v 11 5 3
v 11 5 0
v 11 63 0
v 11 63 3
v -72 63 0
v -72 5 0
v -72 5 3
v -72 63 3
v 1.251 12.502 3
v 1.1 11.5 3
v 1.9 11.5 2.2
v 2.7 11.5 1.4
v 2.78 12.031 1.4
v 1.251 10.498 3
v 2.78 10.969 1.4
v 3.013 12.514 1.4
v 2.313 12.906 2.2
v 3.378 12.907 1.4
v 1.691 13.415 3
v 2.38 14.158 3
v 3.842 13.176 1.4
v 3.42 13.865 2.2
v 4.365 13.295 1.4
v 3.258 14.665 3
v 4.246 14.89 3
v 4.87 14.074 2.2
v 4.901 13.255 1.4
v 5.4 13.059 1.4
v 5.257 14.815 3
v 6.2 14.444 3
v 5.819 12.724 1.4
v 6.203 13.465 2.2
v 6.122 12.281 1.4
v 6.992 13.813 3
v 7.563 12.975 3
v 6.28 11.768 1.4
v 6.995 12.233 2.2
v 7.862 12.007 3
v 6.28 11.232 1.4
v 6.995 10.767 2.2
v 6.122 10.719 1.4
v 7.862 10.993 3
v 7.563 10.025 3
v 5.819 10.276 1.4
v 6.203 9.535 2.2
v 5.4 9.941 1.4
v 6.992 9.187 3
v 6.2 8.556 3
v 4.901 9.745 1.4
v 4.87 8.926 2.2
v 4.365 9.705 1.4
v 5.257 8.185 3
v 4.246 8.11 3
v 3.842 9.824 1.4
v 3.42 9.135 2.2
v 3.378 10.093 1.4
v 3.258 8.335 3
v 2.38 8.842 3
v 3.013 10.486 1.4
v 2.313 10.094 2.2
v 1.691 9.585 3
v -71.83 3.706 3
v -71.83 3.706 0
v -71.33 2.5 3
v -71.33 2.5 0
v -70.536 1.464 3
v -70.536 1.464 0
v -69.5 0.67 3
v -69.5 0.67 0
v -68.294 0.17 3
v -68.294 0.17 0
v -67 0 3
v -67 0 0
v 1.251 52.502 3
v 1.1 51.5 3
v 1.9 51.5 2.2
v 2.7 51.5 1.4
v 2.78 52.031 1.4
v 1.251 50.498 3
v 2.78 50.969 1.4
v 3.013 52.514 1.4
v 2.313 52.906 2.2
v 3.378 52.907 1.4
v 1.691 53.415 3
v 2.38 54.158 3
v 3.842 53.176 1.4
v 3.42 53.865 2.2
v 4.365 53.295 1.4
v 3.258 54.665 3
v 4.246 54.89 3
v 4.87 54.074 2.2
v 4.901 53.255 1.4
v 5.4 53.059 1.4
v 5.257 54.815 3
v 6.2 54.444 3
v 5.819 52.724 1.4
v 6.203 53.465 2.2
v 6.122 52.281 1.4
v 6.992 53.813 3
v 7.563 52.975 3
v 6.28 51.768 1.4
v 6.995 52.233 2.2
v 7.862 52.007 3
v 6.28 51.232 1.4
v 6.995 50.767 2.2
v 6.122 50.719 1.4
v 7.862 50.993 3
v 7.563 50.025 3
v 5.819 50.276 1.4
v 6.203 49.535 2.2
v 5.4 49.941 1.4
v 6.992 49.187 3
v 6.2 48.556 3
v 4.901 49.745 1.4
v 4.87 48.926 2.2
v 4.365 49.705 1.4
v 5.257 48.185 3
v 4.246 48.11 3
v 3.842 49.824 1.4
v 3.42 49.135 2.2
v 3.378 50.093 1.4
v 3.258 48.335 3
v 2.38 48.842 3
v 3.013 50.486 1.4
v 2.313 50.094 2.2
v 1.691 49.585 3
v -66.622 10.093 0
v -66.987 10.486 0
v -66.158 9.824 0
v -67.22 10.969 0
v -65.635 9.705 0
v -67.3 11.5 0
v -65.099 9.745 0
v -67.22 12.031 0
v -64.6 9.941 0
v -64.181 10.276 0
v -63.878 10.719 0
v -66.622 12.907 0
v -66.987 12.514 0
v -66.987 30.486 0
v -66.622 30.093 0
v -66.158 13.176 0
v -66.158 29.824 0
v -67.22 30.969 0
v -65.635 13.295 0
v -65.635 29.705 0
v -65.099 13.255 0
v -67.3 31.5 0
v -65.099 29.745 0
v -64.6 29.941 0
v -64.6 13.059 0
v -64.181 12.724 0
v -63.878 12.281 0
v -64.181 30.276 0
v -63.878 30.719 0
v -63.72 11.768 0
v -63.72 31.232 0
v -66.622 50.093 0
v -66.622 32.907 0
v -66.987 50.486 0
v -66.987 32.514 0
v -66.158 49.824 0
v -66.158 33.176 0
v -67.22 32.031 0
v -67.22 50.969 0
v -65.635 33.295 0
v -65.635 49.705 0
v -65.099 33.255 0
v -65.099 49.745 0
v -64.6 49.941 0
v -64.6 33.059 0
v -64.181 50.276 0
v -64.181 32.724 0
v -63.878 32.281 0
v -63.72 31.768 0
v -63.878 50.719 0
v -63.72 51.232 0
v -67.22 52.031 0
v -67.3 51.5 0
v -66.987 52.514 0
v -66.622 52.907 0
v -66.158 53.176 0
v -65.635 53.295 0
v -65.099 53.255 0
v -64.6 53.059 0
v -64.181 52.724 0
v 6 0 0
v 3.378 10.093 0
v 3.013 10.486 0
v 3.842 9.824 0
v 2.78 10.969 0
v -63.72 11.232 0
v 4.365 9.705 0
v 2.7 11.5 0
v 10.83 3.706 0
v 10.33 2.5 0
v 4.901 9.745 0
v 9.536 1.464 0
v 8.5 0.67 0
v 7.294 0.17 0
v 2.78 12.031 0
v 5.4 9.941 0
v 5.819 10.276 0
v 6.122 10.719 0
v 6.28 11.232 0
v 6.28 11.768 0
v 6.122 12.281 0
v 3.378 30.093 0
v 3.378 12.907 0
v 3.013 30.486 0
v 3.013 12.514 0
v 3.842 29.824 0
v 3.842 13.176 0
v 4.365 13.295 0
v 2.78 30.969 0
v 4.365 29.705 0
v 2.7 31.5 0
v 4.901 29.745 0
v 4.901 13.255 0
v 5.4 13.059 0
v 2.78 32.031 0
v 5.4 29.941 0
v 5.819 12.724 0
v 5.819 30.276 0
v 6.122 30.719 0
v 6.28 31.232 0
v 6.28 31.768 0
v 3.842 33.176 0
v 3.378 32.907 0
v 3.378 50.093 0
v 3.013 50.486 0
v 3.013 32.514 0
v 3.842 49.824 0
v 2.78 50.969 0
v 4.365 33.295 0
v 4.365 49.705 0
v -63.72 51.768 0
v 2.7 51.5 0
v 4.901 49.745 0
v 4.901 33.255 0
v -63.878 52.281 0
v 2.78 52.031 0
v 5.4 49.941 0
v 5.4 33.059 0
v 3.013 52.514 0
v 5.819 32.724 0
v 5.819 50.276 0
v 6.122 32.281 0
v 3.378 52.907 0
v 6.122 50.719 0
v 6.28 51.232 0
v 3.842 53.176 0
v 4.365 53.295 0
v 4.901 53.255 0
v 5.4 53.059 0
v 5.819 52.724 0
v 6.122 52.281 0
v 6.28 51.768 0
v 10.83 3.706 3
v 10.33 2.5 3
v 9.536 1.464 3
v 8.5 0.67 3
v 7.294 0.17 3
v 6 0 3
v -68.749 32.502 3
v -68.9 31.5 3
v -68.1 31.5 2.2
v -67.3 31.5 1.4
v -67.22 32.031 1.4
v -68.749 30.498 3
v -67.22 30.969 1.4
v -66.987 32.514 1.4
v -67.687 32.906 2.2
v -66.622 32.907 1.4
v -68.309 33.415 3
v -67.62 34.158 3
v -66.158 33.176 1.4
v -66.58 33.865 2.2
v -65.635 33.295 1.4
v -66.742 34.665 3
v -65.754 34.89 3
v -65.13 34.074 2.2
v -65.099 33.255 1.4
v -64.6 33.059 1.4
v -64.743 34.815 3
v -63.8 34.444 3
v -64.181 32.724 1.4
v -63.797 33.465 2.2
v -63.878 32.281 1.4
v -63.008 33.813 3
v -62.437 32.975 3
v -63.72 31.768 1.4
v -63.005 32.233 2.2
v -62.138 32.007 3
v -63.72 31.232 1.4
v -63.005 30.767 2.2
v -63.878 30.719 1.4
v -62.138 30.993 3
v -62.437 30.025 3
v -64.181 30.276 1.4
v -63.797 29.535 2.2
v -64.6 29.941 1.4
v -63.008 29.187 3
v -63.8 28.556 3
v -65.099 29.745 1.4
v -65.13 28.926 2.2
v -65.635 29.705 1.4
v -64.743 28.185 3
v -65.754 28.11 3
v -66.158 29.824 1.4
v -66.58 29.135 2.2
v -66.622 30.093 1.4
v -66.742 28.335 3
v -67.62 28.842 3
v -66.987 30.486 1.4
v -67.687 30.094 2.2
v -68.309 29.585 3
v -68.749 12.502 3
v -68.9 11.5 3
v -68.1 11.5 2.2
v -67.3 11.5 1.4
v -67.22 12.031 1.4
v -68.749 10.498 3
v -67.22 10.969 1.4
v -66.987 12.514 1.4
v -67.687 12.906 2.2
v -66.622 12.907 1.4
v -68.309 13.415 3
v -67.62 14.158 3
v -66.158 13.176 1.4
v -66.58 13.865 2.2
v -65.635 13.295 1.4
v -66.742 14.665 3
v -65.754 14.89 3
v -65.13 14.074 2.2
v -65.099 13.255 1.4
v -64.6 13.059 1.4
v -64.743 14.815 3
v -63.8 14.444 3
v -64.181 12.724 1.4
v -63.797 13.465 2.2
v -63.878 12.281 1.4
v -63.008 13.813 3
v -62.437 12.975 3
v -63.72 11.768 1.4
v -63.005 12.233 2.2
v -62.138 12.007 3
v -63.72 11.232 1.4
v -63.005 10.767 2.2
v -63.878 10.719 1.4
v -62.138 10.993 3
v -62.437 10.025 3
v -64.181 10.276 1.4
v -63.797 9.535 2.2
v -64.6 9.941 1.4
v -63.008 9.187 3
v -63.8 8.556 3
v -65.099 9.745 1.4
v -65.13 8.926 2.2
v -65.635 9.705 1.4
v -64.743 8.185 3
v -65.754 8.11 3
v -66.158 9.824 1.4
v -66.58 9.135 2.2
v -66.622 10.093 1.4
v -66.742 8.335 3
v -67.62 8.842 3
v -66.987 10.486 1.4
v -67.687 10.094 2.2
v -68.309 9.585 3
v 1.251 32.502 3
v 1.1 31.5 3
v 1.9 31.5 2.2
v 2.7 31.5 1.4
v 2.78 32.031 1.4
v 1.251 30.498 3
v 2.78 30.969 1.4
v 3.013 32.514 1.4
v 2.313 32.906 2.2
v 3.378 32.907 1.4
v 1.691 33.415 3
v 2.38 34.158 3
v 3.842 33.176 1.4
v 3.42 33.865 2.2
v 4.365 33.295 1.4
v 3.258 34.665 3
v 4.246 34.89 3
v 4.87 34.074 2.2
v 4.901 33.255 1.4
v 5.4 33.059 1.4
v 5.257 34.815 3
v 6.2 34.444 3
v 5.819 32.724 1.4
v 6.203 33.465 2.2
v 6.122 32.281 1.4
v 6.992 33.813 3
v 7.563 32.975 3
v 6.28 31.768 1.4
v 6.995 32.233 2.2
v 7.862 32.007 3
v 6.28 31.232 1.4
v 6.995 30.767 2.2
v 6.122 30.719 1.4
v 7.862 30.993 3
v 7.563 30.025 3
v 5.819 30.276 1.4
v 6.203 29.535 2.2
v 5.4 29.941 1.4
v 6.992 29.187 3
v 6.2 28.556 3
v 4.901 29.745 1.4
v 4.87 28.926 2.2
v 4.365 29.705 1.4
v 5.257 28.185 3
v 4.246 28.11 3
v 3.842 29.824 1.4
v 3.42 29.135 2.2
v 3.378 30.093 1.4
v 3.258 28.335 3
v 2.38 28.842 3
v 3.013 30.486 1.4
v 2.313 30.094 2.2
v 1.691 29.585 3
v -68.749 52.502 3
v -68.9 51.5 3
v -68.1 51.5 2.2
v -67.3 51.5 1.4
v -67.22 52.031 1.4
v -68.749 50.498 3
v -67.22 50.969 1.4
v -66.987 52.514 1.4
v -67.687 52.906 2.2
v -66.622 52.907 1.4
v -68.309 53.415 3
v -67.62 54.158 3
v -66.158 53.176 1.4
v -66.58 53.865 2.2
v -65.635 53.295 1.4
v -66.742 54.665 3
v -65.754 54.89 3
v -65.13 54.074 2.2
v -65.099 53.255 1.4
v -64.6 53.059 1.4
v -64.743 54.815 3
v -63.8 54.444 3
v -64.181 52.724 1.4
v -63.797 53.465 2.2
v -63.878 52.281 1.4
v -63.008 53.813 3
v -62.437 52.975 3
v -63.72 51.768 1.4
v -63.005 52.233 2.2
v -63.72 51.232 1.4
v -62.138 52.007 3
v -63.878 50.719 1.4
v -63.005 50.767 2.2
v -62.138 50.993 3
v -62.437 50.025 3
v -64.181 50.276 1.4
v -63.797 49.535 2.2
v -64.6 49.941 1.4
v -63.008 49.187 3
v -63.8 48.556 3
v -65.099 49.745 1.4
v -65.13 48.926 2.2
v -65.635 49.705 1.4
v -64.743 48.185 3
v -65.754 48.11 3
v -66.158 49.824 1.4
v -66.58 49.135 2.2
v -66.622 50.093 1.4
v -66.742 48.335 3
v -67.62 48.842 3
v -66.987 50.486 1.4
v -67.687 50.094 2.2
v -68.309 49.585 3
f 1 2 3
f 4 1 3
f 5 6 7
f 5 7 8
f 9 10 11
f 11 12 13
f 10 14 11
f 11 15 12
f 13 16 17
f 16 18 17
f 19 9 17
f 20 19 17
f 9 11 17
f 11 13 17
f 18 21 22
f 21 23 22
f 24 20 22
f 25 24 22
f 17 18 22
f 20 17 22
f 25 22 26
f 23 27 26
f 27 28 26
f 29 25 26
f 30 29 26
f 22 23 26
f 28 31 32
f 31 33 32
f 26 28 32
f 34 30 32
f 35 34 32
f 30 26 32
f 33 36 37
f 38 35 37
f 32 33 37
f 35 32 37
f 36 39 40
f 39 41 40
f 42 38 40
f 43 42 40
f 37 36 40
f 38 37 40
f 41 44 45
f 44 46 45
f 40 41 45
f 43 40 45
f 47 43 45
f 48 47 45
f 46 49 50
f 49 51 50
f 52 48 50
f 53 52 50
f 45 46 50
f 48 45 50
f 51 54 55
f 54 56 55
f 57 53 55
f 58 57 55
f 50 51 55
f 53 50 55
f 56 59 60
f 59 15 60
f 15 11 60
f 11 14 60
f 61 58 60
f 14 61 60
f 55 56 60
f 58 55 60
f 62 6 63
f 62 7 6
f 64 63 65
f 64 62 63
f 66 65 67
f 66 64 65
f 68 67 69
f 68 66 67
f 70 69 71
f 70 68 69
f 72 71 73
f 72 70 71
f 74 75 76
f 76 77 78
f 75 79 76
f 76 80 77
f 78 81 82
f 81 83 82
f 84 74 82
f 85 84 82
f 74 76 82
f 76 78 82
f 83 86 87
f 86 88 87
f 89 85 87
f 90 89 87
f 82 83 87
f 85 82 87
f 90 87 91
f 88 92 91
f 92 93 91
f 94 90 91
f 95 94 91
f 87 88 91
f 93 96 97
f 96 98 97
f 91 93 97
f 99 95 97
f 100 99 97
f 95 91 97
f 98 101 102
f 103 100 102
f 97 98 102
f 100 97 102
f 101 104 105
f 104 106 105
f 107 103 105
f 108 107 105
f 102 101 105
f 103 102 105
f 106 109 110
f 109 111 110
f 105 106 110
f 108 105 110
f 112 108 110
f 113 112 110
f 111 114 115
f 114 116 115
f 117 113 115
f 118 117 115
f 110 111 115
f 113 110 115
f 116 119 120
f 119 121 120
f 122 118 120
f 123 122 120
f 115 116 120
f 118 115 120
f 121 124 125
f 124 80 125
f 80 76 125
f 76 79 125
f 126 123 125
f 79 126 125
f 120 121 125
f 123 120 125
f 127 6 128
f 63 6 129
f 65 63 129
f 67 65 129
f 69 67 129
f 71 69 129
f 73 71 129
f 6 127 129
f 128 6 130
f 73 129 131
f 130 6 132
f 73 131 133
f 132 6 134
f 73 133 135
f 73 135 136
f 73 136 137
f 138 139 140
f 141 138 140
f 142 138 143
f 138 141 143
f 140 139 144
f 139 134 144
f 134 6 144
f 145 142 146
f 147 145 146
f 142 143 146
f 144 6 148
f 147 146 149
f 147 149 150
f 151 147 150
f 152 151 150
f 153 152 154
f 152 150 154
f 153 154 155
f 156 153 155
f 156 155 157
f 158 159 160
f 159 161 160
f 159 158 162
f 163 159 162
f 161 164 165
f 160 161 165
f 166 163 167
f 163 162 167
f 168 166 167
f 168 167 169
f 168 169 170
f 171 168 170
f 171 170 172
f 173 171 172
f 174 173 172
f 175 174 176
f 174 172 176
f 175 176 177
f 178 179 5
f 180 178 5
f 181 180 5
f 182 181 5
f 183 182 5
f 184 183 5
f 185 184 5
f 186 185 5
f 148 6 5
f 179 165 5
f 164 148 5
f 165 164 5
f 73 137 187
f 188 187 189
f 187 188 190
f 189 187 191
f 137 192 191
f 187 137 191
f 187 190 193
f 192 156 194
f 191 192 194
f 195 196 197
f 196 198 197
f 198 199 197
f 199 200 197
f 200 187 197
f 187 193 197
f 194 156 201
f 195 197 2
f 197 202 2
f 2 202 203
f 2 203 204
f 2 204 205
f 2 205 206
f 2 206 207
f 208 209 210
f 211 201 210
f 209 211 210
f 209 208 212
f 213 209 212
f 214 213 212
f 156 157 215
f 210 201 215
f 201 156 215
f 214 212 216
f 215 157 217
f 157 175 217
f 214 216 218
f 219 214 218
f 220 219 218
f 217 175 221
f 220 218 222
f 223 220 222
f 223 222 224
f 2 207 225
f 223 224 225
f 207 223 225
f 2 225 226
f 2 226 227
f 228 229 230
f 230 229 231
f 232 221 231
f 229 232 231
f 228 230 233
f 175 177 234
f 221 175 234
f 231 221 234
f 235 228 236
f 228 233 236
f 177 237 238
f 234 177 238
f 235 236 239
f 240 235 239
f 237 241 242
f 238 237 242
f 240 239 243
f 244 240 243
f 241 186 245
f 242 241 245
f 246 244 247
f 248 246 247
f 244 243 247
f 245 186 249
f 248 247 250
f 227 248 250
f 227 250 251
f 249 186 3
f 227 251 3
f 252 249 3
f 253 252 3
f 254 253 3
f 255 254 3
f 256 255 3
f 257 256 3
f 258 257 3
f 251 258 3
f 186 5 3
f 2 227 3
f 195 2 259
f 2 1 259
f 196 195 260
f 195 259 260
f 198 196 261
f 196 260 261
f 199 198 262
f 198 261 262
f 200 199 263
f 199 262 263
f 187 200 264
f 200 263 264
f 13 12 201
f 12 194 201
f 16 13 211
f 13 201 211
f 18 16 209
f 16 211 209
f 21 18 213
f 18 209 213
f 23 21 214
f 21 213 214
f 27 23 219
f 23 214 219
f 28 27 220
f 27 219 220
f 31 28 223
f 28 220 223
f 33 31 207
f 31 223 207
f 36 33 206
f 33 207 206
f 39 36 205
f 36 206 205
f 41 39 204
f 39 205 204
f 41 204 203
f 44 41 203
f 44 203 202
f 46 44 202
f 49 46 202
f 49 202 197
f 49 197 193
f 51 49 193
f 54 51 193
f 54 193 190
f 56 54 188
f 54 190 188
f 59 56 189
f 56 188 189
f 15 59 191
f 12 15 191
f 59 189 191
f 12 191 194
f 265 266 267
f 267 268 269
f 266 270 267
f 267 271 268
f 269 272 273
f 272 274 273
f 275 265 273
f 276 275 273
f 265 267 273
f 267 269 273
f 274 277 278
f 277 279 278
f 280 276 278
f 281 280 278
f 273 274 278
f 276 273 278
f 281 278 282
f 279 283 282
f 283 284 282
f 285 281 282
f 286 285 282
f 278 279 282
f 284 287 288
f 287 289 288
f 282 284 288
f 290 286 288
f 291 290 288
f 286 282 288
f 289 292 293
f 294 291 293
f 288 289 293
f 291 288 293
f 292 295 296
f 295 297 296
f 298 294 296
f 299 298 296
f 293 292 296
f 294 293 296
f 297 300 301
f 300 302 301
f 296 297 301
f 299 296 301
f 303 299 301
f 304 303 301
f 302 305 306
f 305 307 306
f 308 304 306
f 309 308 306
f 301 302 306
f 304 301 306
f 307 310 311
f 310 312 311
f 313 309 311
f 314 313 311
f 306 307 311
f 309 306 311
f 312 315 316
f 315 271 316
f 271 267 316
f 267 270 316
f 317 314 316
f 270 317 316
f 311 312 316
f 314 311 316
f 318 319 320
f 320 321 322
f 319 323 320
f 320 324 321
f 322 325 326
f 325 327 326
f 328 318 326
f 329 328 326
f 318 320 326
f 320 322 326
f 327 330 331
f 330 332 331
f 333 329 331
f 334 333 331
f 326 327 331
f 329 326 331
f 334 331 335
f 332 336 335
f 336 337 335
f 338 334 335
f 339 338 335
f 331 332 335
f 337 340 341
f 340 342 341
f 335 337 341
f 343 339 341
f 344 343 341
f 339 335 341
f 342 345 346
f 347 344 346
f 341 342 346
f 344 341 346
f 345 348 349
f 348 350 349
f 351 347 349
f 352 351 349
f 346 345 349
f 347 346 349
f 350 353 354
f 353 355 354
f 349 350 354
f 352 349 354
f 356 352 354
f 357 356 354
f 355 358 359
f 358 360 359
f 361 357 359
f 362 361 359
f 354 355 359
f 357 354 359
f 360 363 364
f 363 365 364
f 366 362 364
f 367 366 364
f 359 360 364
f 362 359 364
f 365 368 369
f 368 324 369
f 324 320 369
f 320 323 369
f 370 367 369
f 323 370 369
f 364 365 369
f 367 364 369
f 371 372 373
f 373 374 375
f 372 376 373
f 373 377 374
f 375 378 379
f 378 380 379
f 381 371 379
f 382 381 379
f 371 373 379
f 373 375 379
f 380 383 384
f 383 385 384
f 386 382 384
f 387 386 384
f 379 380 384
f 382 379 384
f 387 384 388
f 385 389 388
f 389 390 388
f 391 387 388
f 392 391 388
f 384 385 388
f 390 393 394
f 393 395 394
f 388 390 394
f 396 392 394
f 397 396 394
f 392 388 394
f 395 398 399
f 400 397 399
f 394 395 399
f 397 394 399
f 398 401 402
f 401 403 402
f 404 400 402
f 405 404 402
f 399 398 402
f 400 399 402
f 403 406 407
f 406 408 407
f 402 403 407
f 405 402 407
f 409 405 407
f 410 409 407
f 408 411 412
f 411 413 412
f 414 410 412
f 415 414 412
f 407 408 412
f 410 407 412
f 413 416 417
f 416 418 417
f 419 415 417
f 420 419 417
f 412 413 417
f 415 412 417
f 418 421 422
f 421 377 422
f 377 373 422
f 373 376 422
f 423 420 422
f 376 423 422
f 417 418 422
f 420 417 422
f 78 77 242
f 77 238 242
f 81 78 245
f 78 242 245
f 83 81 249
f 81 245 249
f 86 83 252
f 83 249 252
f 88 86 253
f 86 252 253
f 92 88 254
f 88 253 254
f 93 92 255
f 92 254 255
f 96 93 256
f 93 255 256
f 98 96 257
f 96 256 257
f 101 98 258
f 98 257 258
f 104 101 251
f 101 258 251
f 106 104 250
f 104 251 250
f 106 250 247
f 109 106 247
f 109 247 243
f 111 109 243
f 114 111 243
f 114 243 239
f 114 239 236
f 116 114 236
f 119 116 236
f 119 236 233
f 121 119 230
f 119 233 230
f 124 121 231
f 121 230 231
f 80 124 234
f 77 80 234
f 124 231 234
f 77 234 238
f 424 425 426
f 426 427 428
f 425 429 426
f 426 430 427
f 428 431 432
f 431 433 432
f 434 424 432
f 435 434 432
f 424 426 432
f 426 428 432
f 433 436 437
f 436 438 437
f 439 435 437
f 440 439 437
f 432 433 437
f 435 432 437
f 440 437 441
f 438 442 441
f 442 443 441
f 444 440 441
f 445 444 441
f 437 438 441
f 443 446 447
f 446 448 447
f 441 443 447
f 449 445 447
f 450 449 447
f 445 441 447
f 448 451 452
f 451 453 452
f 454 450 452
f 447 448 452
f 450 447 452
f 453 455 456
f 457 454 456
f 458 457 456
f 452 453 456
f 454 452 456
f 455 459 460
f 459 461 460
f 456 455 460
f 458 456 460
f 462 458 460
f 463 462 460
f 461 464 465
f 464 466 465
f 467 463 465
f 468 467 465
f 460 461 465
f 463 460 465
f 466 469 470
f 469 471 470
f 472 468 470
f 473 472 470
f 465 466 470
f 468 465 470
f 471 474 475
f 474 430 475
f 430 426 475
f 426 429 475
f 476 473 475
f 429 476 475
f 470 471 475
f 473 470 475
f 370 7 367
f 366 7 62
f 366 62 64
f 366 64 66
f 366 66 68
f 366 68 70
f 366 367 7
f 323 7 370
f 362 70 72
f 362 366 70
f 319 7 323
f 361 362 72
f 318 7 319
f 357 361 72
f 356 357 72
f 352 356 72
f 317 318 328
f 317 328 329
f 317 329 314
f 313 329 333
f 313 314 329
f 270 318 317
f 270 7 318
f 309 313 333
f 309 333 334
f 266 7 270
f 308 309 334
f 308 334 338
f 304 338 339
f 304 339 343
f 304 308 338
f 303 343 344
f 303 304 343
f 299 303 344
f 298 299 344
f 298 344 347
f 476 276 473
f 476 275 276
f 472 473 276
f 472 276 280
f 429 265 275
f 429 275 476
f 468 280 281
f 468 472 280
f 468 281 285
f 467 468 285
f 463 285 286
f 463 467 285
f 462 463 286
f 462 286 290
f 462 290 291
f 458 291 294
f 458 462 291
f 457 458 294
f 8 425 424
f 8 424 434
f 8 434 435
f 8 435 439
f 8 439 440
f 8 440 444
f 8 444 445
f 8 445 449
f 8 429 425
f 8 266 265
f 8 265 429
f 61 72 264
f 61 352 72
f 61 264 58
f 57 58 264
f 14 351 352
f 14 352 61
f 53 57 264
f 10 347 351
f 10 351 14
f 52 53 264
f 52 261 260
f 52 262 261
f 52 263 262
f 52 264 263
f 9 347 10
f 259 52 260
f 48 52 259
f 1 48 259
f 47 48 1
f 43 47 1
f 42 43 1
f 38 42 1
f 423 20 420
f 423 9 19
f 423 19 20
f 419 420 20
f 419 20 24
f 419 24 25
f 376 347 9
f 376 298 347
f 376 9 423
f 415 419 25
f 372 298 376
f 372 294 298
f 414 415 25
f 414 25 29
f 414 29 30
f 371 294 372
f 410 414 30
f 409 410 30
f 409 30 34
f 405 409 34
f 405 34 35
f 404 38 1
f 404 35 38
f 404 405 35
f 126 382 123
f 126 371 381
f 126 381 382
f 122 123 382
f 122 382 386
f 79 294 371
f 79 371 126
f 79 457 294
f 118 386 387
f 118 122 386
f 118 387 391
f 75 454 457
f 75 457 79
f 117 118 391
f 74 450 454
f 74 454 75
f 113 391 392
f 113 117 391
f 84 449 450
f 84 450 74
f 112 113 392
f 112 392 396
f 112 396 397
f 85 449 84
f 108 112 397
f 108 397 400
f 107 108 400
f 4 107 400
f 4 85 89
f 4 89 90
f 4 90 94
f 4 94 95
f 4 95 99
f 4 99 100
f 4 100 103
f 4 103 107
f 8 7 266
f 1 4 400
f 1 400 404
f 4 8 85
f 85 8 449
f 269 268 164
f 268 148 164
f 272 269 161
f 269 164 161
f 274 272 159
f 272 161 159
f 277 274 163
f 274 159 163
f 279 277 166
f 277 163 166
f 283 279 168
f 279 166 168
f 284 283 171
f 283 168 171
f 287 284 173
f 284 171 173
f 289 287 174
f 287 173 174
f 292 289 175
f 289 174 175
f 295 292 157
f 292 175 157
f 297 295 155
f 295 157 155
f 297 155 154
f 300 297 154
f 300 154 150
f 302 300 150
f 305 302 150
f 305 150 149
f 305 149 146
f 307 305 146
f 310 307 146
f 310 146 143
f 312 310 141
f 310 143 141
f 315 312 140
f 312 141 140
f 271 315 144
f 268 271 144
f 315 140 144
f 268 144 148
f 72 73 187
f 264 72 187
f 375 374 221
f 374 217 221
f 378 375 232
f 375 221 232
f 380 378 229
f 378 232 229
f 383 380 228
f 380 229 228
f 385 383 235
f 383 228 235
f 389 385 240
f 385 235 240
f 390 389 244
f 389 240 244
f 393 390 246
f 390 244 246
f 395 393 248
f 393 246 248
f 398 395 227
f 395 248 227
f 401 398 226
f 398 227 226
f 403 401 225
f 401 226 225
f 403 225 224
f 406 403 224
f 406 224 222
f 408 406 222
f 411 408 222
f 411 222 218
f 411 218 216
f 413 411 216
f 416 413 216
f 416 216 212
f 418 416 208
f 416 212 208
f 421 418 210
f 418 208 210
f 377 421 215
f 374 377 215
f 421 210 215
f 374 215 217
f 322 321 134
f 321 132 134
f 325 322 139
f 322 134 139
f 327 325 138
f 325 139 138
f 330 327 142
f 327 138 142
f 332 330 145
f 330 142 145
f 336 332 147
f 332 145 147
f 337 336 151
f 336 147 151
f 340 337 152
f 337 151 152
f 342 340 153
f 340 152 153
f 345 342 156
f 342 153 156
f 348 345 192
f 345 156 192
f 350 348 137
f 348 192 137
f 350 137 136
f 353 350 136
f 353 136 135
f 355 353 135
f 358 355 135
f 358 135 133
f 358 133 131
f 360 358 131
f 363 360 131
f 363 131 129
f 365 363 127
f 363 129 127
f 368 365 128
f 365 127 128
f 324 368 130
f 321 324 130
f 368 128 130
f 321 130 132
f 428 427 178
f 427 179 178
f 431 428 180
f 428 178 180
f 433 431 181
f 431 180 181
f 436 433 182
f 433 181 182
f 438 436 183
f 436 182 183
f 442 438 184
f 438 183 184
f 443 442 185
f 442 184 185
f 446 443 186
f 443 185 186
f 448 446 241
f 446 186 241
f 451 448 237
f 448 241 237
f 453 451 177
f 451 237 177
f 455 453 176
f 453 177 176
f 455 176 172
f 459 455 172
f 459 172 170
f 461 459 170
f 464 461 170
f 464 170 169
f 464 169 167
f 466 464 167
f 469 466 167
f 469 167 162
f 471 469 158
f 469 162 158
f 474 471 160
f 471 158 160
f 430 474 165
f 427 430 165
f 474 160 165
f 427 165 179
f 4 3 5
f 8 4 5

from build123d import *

# Parameters (mm, degrees)
SKETCH1_W                                       = 11
SKETCH1_H                                       = 63
SKETCH1_W_2                                     = 60
SKETCH1_H_2                                     = 60
BOSS_EXTRUDE1_DEPTH                             = 3
CSK_FOR_M3_FLAT_HEAD_MACHINE_SCREW1_D           = 3.6
CSK_FOR_M3_FLAT_HEAD_MACHINE_SCREW1_DEPTH       = 6
CSK_FOR_M3_FLAT_HEAD_MACHINE_SCREW1_CSINK_D     = 6.8
CSK_FOR_M3_FLAT_HEAD_MACHINE_SCREW1_CSINK_ANGLE = 90
CSK_FOR_M3_FLAT_HEAD_MACHINE_SCREW1_TIP         = 1.081549114
FILLET1_R                                       = 5


with BuildPart() as part:
    # Sketch1 → Boss-Extrude1 (new body)
    with BuildSketch(Plane.XY):
        with Locations((-66.5, 31.5)):
            Rectangle(SKETCH1_W, SKETCH1_H)
        Polygon((-60, 60), (0, 60), (0, 63), (-61, 63), (-61, 0), (-60, 0), align=None)
        with Locations((-30, 30)):
            Rectangle(SKETCH1_W_2, SKETCH1_H_2)
        with Locations((5.5, 31.5)):
            Rectangle(SKETCH1_W, SKETCH1_H)
    extrude(amount=BOSS_EXTRUDE1_DEPTH)

    # CSK for M3 Flat Head Machine Screw1
    with Locations(Plane.XY.offset(3)):
        with Locations((-65.5, 31.5), (-65.5, 51.5), (-65.5, 11.5), (4.5, 11.5), (4.5, 31.5), (4.5, 51.5)):
            CounterSinkHole(CSK_FOR_M3_FLAT_HEAD_MACHINE_SCREW1_D / 2, CSK_FOR_M3_FLAT_HEAD_MACHINE_SCREW1_CSINK_D / 2, depth=CSK_FOR_M3_FLAT_HEAD_MACHINE_SCREW1_DEPTH, counter_sink_angle=CSK_FOR_M3_FLAT_HEAD_MACHINE_SCREW1_CSINK_ANGLE)
            with Locations((0, 0, -(CSK_FOR_M3_FLAT_HEAD_MACHINE_SCREW1_DEPTH + CSK_FOR_M3_FLAT_HEAD_MACHINE_SCREW1_TIP / 2))):  # 118° drill point
                Cone(0, CSK_FOR_M3_FLAT_HEAD_MACHINE_SCREW1_D / 2, CSK_FOR_M3_FLAT_HEAD_MACHINE_SCREW1_TIP, mode=Mode.SUBTRACT)

    # Fillet1
    fillet1_edges = [part.edges().sort_by_distance(p)[0] for p in [
        (11, 0, 1.5),
        (-72, 0, 1.5),
    ]]
    fillet(fillet1_edges, radius=FILLET1_R)


solid = part.part
